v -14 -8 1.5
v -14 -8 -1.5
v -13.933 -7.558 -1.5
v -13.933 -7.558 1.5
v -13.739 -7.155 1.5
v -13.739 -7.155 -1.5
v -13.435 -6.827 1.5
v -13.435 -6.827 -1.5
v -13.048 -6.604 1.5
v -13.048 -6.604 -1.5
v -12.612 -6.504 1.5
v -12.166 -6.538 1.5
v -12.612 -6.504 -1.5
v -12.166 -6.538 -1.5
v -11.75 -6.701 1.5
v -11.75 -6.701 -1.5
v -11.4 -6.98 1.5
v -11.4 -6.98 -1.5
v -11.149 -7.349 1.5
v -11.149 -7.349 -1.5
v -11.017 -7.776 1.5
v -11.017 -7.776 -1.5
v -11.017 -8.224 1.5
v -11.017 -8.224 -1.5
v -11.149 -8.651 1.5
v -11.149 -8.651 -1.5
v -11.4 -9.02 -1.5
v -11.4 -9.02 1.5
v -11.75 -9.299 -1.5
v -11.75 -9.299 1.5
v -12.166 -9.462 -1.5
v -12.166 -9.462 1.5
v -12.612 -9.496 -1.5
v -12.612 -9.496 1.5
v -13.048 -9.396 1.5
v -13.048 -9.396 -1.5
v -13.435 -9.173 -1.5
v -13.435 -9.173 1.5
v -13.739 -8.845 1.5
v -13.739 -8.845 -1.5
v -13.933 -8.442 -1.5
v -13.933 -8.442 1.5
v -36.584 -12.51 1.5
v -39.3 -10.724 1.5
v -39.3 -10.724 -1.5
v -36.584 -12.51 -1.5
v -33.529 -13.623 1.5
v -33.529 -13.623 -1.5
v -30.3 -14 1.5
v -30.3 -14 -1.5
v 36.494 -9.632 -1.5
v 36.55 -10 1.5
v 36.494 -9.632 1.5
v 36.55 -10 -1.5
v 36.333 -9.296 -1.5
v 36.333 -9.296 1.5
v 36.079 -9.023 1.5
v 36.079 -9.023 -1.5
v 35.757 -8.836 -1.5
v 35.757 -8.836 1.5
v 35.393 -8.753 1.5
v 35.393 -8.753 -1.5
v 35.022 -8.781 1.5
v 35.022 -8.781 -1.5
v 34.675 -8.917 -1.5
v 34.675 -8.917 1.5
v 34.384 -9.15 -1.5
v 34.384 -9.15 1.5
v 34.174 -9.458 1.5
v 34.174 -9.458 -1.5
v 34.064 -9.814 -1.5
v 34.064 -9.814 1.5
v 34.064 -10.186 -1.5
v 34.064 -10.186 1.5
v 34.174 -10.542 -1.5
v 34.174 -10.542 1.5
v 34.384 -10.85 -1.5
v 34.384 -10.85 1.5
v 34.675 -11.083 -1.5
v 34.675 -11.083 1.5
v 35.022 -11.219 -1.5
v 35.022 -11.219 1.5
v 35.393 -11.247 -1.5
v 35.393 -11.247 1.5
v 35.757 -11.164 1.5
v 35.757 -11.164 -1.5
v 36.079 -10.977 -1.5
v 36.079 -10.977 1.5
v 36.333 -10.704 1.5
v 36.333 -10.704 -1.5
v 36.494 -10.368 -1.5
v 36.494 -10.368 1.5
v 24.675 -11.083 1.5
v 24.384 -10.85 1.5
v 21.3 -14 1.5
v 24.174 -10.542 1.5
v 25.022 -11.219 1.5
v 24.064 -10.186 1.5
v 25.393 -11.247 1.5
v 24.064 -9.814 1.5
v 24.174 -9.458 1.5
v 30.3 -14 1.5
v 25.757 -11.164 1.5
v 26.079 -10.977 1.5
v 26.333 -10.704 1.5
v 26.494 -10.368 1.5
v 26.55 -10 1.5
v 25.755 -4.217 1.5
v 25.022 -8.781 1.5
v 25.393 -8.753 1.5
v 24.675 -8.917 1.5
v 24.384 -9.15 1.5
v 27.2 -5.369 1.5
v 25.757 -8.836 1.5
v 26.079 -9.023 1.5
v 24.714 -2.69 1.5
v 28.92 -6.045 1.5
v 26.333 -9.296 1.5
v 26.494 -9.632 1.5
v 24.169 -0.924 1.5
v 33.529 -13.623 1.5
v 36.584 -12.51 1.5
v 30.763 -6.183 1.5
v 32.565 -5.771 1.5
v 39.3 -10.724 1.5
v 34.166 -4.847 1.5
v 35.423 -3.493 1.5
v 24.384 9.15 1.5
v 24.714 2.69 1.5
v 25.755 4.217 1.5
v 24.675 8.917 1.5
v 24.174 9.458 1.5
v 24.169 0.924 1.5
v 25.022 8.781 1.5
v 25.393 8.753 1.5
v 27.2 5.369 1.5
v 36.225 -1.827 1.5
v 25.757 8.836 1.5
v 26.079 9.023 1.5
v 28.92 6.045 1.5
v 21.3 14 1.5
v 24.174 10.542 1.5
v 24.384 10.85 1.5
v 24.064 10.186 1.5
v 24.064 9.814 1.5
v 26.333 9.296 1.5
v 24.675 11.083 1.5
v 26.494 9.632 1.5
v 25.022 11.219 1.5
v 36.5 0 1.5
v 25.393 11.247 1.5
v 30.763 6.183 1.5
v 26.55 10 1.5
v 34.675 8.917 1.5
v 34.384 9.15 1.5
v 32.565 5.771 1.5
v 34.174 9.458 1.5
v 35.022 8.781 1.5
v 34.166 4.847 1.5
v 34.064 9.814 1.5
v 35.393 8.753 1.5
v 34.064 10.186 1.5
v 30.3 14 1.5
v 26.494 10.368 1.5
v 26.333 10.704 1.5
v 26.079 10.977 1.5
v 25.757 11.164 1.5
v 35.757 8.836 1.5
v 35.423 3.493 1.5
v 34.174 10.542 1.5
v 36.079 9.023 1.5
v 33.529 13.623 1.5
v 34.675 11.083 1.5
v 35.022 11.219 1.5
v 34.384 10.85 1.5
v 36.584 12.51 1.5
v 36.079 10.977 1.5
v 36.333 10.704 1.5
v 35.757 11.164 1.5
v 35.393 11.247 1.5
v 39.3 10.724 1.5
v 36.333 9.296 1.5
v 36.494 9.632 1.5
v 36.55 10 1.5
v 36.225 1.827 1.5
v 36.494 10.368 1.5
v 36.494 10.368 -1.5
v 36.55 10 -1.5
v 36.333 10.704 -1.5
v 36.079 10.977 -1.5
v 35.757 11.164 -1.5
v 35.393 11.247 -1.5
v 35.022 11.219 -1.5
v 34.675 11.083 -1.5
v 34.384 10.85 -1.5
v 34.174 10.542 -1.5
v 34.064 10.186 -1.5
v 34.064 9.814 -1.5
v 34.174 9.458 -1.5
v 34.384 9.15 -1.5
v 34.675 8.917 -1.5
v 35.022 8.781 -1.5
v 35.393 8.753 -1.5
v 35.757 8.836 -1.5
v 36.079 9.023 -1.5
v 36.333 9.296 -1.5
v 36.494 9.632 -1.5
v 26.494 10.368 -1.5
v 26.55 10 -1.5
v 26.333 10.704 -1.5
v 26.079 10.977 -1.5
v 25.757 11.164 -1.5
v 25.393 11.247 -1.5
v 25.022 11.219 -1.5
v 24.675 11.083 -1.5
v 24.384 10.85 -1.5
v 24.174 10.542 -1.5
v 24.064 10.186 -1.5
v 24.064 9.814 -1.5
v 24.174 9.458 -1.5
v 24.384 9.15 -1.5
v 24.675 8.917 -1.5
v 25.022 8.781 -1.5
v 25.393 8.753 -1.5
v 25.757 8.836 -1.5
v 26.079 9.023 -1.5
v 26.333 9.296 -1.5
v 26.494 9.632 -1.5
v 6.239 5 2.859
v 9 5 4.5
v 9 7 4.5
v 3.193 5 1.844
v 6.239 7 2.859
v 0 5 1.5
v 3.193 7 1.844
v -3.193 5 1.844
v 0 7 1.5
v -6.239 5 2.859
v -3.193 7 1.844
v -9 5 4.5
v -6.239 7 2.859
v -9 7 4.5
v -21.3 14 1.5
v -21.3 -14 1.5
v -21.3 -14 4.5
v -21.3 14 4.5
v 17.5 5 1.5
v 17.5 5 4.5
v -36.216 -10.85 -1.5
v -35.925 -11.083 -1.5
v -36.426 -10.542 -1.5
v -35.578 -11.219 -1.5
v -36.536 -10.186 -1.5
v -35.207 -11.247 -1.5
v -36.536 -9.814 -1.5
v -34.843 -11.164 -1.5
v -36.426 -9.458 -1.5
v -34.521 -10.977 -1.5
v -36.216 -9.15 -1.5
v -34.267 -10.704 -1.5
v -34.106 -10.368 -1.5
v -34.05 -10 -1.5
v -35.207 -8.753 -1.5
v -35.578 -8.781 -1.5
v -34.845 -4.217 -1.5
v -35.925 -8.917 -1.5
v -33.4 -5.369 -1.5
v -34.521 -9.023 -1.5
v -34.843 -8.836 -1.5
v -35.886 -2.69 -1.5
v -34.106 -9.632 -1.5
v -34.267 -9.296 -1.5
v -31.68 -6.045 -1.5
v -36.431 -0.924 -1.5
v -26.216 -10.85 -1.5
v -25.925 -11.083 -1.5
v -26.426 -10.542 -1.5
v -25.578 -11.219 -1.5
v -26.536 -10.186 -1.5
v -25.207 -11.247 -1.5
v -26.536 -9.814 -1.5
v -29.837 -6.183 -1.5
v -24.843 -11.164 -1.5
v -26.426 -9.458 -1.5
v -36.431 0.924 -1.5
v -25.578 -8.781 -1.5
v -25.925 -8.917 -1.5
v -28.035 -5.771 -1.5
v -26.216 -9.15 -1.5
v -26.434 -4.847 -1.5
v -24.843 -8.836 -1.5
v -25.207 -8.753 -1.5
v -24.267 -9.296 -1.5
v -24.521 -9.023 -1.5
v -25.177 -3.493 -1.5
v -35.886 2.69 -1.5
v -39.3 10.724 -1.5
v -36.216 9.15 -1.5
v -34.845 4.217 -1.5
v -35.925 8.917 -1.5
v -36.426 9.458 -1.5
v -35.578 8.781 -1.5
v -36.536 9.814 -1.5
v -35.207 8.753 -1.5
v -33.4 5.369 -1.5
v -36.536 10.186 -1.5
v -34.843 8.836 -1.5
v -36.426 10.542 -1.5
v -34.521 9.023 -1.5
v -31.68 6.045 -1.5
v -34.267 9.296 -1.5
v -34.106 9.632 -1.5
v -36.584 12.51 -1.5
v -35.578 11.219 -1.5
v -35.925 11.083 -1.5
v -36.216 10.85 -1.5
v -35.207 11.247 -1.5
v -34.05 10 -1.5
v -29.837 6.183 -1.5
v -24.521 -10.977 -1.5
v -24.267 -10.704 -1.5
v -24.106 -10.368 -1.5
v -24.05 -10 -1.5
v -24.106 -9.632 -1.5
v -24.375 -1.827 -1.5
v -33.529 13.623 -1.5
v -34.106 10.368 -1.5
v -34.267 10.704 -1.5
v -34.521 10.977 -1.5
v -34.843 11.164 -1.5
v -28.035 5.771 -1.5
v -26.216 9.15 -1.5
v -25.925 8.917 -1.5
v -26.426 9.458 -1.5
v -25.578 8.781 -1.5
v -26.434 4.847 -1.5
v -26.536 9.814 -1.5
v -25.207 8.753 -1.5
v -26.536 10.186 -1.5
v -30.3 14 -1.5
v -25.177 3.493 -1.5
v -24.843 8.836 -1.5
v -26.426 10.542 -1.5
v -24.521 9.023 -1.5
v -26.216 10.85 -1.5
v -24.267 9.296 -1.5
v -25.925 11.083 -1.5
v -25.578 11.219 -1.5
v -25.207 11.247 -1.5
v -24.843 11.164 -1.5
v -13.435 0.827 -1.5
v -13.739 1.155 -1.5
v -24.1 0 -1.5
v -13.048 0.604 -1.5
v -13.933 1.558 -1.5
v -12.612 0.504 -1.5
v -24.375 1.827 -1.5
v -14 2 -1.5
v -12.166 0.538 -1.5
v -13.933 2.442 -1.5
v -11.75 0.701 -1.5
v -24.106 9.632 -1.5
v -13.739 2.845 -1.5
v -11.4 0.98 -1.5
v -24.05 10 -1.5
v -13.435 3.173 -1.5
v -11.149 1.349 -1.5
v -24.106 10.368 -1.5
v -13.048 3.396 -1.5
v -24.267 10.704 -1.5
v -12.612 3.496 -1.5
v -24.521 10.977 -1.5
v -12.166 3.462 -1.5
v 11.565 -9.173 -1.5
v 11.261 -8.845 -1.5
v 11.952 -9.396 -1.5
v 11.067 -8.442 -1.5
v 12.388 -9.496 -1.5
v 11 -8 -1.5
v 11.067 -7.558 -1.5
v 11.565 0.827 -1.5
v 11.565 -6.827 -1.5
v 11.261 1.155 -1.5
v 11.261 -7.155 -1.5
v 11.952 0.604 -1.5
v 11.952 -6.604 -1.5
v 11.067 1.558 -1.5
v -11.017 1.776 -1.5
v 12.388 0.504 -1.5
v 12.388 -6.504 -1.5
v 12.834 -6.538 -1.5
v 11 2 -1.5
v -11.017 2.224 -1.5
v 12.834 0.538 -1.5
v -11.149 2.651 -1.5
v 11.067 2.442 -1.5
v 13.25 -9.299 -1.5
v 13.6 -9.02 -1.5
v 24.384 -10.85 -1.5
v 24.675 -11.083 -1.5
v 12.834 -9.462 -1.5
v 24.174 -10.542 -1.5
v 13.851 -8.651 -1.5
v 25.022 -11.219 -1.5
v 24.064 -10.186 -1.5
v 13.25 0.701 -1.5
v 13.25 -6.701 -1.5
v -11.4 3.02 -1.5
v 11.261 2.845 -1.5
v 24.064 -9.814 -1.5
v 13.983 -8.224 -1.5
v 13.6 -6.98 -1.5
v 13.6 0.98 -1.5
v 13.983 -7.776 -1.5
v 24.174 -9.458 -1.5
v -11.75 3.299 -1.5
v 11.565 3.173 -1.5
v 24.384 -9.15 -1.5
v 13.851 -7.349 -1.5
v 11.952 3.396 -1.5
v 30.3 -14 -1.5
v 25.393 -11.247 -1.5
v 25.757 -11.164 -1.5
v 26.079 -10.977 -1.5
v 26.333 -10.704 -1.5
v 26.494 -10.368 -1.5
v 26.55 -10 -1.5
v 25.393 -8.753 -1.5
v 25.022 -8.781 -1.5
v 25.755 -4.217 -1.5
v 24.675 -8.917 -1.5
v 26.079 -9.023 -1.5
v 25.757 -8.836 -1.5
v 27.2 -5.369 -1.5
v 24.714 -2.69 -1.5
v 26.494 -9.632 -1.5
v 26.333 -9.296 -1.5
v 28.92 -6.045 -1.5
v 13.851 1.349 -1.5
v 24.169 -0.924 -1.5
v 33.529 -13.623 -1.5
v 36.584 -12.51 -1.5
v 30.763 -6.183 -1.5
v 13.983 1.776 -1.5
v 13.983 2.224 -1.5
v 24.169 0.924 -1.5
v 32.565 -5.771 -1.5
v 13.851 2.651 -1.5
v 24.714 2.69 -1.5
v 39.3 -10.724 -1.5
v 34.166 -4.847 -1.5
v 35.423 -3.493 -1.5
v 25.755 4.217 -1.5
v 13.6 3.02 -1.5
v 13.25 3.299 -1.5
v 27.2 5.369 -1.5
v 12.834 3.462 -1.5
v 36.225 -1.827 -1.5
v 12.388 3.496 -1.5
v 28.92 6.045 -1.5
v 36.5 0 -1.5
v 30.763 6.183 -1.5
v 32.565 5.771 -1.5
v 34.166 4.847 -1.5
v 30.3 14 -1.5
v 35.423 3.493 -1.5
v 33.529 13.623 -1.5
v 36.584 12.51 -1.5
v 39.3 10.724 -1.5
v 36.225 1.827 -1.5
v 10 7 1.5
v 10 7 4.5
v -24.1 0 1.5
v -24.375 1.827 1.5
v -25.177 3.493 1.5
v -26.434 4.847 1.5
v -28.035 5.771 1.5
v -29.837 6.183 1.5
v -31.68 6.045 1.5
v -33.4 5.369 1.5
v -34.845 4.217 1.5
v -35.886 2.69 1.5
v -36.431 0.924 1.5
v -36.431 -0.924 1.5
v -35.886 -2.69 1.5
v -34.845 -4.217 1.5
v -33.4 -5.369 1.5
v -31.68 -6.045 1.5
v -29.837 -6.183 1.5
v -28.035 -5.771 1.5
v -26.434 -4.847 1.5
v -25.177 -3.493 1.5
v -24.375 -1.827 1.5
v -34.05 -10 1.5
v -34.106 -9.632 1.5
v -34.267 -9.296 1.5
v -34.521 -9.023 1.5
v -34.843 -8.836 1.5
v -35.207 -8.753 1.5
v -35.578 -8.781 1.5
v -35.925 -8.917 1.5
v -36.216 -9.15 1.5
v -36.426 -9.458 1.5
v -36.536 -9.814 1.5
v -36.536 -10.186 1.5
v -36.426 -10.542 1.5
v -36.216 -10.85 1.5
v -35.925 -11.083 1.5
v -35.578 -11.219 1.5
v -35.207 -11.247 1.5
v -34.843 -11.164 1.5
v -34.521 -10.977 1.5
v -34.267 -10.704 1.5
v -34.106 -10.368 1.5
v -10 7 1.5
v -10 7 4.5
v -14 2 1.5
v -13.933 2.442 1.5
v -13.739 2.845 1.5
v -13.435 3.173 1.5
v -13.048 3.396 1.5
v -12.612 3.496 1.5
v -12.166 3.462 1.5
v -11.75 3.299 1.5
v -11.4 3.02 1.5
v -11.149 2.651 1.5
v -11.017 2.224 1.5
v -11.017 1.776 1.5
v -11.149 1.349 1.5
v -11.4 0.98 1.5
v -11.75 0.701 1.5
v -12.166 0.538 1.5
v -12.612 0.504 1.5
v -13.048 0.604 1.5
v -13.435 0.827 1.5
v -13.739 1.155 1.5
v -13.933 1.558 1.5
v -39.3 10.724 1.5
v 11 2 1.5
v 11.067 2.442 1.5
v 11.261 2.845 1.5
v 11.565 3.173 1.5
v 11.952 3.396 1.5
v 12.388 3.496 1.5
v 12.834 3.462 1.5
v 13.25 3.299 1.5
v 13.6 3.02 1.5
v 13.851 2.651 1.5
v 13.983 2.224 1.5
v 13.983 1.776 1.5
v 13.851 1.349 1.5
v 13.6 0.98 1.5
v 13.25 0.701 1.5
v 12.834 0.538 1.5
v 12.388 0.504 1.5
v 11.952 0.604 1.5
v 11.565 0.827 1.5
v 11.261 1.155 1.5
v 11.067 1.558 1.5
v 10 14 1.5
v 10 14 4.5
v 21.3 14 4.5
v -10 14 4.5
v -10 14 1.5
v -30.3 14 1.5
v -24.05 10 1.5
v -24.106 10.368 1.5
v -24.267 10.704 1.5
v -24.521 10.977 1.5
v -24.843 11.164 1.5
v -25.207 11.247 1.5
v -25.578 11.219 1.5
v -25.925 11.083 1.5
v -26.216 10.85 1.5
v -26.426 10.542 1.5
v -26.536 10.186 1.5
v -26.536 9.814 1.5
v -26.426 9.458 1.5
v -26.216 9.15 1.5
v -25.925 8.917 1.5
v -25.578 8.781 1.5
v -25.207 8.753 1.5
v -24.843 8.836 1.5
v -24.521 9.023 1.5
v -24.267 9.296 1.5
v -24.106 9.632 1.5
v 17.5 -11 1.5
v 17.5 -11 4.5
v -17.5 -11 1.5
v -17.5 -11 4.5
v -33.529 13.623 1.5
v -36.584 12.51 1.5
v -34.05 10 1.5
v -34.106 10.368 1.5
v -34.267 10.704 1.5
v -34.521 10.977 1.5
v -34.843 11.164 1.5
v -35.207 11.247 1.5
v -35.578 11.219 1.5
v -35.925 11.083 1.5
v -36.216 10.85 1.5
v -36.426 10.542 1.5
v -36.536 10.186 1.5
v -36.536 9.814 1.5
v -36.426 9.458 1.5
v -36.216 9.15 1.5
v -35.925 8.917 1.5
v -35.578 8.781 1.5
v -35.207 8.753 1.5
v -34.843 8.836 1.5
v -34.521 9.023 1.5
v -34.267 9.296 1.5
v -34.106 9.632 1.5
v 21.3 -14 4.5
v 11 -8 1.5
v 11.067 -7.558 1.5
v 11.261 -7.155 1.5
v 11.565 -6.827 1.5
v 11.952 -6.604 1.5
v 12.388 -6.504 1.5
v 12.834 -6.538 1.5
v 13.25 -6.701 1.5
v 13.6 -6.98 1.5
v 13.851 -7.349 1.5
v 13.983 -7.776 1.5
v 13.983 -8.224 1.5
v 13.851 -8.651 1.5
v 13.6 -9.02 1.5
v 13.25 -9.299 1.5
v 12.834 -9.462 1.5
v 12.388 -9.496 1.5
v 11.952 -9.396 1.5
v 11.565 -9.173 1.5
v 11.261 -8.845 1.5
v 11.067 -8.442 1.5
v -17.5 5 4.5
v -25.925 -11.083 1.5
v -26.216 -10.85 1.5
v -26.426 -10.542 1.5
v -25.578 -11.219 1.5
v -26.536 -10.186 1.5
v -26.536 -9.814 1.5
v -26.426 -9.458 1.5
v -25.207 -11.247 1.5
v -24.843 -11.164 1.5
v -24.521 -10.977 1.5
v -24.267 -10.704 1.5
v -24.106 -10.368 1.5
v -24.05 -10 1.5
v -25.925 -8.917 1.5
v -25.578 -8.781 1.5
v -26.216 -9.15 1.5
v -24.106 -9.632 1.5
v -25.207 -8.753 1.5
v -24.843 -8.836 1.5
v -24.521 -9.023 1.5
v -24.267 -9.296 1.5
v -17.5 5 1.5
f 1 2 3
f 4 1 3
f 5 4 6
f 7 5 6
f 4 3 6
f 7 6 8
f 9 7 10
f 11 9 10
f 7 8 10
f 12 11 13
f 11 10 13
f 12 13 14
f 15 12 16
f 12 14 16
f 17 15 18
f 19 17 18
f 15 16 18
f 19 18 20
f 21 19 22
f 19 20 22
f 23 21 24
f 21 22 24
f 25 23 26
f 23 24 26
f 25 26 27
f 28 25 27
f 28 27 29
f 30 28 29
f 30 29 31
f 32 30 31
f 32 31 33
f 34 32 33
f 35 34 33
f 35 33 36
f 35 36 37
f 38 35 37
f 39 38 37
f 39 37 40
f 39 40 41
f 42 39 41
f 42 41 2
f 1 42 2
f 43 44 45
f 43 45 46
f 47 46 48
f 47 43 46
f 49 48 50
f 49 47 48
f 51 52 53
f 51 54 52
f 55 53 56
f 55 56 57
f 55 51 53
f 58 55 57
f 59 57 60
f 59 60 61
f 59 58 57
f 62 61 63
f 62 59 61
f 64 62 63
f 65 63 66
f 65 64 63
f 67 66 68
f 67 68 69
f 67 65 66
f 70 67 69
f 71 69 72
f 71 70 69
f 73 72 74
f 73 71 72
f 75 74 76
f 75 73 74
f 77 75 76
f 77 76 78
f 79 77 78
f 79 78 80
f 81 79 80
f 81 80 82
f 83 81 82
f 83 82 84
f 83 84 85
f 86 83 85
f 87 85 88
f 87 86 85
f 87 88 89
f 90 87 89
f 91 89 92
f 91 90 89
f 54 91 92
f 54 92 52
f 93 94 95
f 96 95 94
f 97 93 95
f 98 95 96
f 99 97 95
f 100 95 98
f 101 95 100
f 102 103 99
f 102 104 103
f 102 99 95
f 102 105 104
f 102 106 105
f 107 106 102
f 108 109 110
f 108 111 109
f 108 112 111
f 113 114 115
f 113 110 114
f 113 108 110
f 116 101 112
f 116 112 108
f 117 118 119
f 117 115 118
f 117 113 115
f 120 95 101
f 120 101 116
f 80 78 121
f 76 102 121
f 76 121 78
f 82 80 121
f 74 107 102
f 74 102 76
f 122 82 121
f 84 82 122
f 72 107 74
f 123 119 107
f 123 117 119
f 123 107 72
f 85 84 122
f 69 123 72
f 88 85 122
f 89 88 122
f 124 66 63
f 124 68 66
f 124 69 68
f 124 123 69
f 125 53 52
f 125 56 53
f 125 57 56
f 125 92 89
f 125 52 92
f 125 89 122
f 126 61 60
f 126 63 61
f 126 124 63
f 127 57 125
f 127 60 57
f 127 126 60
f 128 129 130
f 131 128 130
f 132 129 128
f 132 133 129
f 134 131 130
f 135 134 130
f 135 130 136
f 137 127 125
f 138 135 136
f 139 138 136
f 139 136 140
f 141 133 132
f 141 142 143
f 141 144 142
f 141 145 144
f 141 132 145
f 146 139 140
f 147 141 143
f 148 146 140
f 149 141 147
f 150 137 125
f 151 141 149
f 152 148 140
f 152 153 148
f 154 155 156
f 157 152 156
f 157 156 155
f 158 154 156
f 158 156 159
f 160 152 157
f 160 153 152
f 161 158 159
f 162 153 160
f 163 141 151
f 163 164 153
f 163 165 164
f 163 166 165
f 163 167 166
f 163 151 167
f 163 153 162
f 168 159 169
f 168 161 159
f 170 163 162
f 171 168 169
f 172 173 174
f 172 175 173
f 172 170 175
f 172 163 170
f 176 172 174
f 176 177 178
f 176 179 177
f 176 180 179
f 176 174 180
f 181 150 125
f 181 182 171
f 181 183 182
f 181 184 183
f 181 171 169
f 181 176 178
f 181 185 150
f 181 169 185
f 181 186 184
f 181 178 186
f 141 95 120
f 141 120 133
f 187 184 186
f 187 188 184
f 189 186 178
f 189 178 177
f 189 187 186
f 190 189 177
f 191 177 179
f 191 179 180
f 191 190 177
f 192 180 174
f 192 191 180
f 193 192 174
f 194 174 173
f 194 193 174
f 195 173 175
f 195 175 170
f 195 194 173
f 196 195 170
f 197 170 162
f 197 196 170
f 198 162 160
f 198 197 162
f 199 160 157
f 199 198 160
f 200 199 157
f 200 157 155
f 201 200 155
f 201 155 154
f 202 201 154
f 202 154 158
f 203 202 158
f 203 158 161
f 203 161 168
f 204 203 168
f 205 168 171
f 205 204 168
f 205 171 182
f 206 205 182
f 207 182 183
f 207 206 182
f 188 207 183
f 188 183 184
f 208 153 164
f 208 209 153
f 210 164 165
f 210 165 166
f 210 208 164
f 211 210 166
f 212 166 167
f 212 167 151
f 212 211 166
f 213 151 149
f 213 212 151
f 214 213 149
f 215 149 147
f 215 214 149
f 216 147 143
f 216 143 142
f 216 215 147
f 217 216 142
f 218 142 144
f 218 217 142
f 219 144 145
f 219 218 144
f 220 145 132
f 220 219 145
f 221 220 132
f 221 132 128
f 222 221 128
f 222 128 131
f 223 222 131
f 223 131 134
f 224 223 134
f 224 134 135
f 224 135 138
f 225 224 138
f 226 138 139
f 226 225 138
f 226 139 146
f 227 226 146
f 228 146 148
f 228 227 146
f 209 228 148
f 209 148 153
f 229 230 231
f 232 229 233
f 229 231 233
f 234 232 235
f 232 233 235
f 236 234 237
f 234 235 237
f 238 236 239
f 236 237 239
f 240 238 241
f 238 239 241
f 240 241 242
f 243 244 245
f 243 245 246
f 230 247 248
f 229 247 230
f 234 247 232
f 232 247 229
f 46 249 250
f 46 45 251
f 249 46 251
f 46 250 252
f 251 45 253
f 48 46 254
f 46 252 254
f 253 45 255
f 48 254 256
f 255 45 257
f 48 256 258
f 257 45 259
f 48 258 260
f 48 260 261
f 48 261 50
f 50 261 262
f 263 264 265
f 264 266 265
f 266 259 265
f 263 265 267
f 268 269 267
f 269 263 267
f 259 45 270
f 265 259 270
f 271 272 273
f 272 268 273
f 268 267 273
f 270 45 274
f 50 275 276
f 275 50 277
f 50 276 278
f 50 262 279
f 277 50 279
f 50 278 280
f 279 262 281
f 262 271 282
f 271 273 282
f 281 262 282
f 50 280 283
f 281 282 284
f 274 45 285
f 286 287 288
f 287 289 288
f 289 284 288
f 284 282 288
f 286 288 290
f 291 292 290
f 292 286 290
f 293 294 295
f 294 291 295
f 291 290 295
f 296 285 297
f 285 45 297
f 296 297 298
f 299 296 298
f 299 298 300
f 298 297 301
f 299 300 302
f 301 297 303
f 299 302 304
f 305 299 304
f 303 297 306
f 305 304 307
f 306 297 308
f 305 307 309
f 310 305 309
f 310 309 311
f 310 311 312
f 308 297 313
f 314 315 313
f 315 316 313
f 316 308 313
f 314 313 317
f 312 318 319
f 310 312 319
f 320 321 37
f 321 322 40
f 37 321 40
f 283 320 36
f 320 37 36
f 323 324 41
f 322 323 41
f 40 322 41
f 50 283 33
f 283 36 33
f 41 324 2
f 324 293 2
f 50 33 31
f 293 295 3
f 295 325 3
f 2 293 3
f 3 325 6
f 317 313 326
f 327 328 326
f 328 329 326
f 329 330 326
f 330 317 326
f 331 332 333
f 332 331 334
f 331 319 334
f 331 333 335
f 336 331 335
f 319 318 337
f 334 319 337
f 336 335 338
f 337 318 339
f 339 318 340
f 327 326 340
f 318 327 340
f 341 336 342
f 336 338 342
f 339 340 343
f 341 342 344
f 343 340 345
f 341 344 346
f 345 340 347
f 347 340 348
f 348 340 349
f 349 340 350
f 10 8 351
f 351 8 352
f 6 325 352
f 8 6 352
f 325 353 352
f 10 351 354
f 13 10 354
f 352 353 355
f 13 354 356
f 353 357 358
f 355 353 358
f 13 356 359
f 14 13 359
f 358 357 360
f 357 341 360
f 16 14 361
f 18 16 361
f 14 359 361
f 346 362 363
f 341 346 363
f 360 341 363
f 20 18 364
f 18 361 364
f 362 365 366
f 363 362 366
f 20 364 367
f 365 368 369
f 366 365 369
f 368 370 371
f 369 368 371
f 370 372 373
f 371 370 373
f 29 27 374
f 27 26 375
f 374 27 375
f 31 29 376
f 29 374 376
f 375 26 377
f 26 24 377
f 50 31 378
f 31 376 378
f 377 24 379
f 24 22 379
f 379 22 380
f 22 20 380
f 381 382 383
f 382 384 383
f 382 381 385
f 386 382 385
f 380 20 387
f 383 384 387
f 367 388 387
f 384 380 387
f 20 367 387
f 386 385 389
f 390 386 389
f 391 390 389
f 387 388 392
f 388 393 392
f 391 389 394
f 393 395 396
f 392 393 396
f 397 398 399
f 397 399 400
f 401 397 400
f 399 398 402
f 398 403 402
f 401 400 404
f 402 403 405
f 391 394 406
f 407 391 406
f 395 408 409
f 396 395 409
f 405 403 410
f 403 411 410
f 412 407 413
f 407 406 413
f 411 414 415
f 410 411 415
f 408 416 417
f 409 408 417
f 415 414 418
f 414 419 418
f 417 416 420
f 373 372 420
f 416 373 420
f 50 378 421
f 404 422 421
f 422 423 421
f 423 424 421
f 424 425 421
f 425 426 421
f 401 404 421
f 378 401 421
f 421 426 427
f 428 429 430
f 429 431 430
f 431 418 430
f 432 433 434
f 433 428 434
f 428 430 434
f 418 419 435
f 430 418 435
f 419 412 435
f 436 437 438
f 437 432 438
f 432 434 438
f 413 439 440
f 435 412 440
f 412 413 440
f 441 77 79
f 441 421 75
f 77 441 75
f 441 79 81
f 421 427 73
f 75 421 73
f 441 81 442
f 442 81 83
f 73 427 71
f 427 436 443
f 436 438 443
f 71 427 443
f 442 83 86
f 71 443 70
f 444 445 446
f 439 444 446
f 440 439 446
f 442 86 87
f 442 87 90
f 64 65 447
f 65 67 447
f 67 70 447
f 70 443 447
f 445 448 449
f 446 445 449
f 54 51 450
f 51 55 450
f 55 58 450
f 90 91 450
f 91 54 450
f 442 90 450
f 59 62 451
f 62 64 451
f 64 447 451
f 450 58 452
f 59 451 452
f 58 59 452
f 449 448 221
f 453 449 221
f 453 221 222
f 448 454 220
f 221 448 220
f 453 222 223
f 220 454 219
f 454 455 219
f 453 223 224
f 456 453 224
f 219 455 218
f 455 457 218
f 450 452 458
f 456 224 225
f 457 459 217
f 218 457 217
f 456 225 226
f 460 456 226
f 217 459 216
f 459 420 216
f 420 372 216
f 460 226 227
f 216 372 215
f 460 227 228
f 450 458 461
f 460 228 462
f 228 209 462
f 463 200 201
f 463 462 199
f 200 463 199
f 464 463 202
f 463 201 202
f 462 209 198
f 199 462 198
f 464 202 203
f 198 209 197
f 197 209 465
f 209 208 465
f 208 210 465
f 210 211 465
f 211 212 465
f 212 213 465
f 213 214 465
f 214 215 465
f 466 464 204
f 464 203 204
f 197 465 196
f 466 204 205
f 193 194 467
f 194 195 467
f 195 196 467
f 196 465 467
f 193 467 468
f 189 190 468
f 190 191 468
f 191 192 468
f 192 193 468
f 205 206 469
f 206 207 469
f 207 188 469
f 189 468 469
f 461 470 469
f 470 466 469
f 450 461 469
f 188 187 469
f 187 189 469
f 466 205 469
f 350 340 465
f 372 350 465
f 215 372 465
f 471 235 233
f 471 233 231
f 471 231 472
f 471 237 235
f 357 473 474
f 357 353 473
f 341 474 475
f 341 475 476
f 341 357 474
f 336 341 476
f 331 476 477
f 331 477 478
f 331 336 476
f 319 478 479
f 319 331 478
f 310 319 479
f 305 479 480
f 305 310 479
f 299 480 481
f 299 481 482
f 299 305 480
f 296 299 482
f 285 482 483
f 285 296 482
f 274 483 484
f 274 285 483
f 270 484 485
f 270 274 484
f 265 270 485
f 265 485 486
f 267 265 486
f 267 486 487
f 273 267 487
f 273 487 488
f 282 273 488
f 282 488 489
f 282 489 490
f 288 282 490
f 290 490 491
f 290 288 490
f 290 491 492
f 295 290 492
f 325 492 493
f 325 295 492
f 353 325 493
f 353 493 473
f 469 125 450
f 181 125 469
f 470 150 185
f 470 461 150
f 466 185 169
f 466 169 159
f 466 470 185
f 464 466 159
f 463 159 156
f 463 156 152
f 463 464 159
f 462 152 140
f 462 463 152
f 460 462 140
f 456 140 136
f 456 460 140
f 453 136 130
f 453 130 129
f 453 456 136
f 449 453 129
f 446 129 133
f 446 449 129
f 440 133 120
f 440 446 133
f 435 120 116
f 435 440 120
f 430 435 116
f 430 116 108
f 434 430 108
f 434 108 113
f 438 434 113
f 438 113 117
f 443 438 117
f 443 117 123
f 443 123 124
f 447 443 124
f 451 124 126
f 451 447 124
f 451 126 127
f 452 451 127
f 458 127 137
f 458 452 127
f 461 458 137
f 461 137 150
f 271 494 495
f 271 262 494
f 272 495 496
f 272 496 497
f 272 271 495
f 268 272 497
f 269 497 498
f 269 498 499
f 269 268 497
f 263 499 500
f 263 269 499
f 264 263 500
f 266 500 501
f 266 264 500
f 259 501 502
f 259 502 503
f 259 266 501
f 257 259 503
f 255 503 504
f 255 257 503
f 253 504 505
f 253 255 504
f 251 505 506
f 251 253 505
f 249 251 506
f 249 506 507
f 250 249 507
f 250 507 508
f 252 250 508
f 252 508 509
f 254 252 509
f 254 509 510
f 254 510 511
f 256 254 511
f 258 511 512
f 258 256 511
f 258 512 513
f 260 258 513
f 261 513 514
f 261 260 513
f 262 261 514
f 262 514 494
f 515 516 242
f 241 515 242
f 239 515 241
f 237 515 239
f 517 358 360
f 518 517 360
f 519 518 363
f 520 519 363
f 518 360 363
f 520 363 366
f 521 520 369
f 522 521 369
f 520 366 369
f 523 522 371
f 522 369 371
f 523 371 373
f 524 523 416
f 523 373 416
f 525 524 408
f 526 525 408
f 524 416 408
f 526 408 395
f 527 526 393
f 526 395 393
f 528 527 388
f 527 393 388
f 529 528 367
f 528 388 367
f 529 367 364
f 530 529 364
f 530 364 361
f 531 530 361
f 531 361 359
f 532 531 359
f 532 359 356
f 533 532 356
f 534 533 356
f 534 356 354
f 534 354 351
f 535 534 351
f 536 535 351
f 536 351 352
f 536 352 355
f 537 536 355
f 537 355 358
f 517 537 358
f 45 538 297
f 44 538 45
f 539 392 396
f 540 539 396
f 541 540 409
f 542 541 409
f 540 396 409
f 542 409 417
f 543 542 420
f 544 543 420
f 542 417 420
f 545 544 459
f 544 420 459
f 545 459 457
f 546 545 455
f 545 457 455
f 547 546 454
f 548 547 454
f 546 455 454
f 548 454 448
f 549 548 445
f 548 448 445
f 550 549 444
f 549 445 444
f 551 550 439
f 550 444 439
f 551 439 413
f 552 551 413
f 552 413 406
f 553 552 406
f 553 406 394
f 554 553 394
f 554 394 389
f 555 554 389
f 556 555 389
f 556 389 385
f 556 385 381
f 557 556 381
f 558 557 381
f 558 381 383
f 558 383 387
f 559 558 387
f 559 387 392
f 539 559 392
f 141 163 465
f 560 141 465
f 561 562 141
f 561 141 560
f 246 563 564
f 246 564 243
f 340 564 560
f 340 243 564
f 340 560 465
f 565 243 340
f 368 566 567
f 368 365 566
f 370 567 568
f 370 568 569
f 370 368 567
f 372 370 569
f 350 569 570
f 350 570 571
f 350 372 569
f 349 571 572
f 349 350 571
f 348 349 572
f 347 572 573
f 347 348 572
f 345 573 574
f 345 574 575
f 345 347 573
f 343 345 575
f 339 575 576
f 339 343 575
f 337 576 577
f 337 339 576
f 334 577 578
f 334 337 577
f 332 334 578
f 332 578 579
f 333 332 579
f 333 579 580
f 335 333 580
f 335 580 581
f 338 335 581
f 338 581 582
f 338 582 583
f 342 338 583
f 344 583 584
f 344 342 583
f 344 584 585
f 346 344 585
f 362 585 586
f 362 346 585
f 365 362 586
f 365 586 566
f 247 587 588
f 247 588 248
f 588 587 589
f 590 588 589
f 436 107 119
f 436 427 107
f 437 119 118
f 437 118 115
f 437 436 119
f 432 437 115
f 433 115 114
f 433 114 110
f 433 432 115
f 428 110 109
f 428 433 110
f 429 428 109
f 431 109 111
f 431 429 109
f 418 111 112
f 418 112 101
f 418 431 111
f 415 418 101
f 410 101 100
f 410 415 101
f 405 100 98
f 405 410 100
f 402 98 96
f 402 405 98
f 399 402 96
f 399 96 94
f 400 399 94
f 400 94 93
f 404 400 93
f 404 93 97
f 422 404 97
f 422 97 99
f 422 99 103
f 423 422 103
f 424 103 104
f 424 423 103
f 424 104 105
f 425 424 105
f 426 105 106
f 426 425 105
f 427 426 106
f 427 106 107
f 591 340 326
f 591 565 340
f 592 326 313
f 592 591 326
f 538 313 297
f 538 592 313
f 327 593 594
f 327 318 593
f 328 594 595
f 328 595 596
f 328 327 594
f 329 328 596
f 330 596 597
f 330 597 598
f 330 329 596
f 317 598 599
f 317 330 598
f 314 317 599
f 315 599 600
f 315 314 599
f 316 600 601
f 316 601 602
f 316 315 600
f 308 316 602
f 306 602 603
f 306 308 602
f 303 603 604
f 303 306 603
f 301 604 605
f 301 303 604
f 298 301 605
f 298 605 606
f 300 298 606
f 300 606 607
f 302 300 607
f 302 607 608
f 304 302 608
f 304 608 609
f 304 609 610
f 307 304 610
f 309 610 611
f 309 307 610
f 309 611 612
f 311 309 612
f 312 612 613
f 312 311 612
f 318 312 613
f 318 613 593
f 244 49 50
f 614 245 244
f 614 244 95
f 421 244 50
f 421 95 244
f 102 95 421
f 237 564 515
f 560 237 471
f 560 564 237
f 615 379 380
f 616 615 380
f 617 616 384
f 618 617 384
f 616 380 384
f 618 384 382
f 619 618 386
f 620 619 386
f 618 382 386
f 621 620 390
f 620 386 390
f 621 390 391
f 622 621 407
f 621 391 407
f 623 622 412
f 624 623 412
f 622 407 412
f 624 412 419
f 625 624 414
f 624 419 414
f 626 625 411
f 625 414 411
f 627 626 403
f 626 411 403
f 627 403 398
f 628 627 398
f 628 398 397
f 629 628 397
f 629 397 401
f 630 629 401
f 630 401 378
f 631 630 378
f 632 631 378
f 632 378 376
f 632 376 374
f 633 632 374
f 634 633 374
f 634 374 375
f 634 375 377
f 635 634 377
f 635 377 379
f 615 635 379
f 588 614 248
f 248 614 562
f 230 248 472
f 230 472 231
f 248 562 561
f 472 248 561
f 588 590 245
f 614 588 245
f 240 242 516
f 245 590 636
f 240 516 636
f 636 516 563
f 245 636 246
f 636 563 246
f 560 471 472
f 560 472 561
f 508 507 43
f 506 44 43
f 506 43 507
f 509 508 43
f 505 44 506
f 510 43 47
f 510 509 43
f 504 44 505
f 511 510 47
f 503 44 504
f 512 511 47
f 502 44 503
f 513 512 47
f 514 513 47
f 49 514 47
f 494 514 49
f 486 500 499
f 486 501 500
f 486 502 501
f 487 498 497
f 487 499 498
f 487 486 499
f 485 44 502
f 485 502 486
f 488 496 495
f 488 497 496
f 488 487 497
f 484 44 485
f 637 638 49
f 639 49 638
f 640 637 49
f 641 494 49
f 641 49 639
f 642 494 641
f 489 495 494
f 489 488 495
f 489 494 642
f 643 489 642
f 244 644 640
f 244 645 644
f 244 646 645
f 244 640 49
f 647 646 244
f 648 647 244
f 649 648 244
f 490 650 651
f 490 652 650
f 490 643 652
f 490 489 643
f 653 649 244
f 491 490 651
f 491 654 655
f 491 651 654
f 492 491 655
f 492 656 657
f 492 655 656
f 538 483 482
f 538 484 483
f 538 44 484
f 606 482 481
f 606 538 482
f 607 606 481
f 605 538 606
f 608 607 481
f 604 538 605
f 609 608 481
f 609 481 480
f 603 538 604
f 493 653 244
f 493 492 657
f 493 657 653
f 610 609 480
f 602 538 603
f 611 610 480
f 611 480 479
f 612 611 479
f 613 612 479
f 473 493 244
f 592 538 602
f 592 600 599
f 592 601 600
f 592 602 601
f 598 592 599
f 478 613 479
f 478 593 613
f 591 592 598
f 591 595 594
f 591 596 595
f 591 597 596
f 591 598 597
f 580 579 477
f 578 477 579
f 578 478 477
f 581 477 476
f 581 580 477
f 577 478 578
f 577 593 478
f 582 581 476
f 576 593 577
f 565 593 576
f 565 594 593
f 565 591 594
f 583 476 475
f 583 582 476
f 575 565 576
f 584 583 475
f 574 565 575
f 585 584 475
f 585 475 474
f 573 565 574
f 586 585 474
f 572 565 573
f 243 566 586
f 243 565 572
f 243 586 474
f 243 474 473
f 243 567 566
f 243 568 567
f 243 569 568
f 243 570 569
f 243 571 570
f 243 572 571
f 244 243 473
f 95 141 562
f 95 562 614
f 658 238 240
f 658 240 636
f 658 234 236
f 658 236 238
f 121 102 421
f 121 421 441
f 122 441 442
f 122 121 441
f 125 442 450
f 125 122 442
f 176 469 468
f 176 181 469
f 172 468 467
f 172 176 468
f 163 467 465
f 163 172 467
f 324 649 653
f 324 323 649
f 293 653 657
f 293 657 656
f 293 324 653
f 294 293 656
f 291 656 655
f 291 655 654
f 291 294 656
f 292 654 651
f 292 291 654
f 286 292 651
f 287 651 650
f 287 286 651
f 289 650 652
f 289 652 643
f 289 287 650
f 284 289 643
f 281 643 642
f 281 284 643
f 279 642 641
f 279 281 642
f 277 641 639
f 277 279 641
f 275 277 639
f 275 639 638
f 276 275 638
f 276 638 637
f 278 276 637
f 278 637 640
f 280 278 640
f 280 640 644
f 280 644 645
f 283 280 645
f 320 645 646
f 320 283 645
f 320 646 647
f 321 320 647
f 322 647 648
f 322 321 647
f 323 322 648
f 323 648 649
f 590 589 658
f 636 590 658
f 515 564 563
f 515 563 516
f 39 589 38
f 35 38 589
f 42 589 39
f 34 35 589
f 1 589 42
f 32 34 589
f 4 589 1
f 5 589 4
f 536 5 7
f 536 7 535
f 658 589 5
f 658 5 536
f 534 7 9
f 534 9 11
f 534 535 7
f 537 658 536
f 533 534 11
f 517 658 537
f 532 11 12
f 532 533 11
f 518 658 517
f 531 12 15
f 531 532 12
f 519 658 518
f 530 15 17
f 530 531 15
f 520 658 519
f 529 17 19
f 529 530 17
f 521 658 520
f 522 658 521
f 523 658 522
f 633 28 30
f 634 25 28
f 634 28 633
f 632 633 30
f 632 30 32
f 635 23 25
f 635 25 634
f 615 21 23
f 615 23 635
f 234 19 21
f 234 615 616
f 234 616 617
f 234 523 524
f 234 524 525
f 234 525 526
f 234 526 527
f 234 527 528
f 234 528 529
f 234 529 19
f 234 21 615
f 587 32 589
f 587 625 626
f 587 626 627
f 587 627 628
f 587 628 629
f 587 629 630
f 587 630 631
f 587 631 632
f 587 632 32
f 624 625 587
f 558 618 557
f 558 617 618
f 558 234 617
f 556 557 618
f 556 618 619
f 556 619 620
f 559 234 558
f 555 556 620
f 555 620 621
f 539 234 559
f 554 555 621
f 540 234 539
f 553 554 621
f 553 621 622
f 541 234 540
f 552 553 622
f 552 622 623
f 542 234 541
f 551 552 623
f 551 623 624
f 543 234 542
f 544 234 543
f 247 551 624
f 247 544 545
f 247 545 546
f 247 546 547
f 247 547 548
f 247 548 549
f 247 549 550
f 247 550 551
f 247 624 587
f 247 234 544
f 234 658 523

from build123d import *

# Parameters (mm, degrees)
SKETCH1_R              = 6.2
SKETCH1_R_2            = 1.25
MAIN_DEPTH             = 1.5
SKETCH2_W              = 35
SKETCH2_H              = 16
FRAMEWORK_DEPTH        = 3
SKETCH3_R              = 1.5
FIXHOLE_DEPTH          = 7
HOLEPATTERN_COUNT      = 2
HOLEPATTERN_PITCH      = 25
HOLEPATTERN_COUNT_DIR2 = 2
HOLEPATTERN_PITCH_DIR2 = 10
CUT_EXTRUDE1_REACH     = 23
SKETCH4_R              = 15


with BuildPart() as part:
    # Sketch1 → Main (new body, symmetric)
    with BuildSketch(Plane.XY):
        with BuildLine():
            Line((-39.3, 10.723805295), (-39.3, -10.723805295))
            ThreePointArc((-39.3, -10.723805295), (-35.08887909, -13.155479355), (-30.3, -14))
            Line((-30.3, -14), (30.3, -14))
            ThreePointArc((30.3, -14), (35.08887909, -13.155479355), (39.3, -10.723805295))
            Line((39.3, -10.723805295), (39.3, 10.723805295))
            ThreePointArc((39.3, 10.723805295), (35.08887909, 13.155479355), (30.3, 14))
            Line((30.3, 14), (-30.3, 14))
            ThreePointArc((-30.3, 14), (-35.08887909, 13.155479355), (-39.3, 10.723805295))
        make_face()
        with Locations((-30.3, 0)):
            Circle(SKETCH1_R, mode=Mode.SUBTRACT)
        with Locations((-35.3, 10)):
            Circle(SKETCH1_R_2, mode=Mode.SUBTRACT)
        with Locations((-25.3, 10)):
            Circle(SKETCH1_R_2, mode=Mode.SUBTRACT)
        with Locations((-35.3, -10)):
            Circle(SKETCH1_R_2, mode=Mode.SUBTRACT)
        with Locations((-25.3, -10)):
            Circle(SKETCH1_R_2, mode=Mode.SUBTRACT)
        with Locations((30.3, 0)):
            Circle(SKETCH1_R, mode=Mode.SUBTRACT)
        with Locations((25.3, 10)):
            Circle(SKETCH1_R_2, mode=Mode.SUBTRACT)
        with Locations((35.3, 10)):
            Circle(SKETCH1_R_2, mode=Mode.SUBTRACT)
        with Locations((25.3, -10)):
            Circle(SKETCH1_R_2, mode=Mode.SUBTRACT)
        with Locations((35.3, -10)):
            Circle(SKETCH1_R_2, mode=Mode.SUBTRACT)
    extrude(amount=MAIN_DEPTH, both=True)

    # Sketch2 → Framework (add)
    with BuildSketch(Plane(origin=(0, 0, 1.5), x_dir=(-1, 0, 0), z_dir=(0, 0, -1))):
        Polygon((21.3, 14), (10, 14), (10, 7), (-10, 7), (-10, 14), (-21.3, 14), (-21.3, -14), (21.3, -14), align=None)
        with Locations((0, -3)):
            Rectangle(SKETCH2_W, SKETCH2_H, mode=Mode.SUBTRACT)
    extrude(amount=-FRAMEWORK_DEPTH)

    # Sketch3 → FixHole (cut, through all)
    with BuildSketch(Plane(origin=(0, 0, -1.5), x_dir=(-1, 0, 0), z_dir=(0, 0, -1))):
        with Locations((12.5, -8)):
            Circle(SKETCH3_R)
    fixhole = extrude(amount=-FIXHOLE_DEPTH, mode=Mode.SUBTRACT)

    # HolePattern: FixHole 2 × 2
    with Locations(*[(i * HOLEPATTERN_PITCH, j * HOLEPATTERN_PITCH_DIR2, 0) for i in range(HOLEPATTERN_COUNT) for j in range(HOLEPATTERN_COUNT_DIR2) if (i, j) != (0, 0)]):
        add(fixhole, mode=Mode.SUBTRACT)

    # Sketch4 → Cut-Extrude1 (cut, up to next)
    with BuildSketch(Plane(origin=(0, 7, 0), x_dir=(1, 0, 0), z_dir=(0, 1, 0)), mode=Mode.PRIVATE) as cut_extrude1_sk1:
        with Locations((0, -16.5)):
            Circle(SKETCH4_R)
    cut_extrude1_tool1 = extrude(cut_extrude1_sk1.sketch, amount=-CUT_EXTRUDE1_REACH, mode=Mode.PRIVATE) & part.part
    add(cut_extrude1_tool1.solids().sort_by_distance((0, 7, 16.5))[0], mode=Mode.SUBTRACT)


solid = part.part
